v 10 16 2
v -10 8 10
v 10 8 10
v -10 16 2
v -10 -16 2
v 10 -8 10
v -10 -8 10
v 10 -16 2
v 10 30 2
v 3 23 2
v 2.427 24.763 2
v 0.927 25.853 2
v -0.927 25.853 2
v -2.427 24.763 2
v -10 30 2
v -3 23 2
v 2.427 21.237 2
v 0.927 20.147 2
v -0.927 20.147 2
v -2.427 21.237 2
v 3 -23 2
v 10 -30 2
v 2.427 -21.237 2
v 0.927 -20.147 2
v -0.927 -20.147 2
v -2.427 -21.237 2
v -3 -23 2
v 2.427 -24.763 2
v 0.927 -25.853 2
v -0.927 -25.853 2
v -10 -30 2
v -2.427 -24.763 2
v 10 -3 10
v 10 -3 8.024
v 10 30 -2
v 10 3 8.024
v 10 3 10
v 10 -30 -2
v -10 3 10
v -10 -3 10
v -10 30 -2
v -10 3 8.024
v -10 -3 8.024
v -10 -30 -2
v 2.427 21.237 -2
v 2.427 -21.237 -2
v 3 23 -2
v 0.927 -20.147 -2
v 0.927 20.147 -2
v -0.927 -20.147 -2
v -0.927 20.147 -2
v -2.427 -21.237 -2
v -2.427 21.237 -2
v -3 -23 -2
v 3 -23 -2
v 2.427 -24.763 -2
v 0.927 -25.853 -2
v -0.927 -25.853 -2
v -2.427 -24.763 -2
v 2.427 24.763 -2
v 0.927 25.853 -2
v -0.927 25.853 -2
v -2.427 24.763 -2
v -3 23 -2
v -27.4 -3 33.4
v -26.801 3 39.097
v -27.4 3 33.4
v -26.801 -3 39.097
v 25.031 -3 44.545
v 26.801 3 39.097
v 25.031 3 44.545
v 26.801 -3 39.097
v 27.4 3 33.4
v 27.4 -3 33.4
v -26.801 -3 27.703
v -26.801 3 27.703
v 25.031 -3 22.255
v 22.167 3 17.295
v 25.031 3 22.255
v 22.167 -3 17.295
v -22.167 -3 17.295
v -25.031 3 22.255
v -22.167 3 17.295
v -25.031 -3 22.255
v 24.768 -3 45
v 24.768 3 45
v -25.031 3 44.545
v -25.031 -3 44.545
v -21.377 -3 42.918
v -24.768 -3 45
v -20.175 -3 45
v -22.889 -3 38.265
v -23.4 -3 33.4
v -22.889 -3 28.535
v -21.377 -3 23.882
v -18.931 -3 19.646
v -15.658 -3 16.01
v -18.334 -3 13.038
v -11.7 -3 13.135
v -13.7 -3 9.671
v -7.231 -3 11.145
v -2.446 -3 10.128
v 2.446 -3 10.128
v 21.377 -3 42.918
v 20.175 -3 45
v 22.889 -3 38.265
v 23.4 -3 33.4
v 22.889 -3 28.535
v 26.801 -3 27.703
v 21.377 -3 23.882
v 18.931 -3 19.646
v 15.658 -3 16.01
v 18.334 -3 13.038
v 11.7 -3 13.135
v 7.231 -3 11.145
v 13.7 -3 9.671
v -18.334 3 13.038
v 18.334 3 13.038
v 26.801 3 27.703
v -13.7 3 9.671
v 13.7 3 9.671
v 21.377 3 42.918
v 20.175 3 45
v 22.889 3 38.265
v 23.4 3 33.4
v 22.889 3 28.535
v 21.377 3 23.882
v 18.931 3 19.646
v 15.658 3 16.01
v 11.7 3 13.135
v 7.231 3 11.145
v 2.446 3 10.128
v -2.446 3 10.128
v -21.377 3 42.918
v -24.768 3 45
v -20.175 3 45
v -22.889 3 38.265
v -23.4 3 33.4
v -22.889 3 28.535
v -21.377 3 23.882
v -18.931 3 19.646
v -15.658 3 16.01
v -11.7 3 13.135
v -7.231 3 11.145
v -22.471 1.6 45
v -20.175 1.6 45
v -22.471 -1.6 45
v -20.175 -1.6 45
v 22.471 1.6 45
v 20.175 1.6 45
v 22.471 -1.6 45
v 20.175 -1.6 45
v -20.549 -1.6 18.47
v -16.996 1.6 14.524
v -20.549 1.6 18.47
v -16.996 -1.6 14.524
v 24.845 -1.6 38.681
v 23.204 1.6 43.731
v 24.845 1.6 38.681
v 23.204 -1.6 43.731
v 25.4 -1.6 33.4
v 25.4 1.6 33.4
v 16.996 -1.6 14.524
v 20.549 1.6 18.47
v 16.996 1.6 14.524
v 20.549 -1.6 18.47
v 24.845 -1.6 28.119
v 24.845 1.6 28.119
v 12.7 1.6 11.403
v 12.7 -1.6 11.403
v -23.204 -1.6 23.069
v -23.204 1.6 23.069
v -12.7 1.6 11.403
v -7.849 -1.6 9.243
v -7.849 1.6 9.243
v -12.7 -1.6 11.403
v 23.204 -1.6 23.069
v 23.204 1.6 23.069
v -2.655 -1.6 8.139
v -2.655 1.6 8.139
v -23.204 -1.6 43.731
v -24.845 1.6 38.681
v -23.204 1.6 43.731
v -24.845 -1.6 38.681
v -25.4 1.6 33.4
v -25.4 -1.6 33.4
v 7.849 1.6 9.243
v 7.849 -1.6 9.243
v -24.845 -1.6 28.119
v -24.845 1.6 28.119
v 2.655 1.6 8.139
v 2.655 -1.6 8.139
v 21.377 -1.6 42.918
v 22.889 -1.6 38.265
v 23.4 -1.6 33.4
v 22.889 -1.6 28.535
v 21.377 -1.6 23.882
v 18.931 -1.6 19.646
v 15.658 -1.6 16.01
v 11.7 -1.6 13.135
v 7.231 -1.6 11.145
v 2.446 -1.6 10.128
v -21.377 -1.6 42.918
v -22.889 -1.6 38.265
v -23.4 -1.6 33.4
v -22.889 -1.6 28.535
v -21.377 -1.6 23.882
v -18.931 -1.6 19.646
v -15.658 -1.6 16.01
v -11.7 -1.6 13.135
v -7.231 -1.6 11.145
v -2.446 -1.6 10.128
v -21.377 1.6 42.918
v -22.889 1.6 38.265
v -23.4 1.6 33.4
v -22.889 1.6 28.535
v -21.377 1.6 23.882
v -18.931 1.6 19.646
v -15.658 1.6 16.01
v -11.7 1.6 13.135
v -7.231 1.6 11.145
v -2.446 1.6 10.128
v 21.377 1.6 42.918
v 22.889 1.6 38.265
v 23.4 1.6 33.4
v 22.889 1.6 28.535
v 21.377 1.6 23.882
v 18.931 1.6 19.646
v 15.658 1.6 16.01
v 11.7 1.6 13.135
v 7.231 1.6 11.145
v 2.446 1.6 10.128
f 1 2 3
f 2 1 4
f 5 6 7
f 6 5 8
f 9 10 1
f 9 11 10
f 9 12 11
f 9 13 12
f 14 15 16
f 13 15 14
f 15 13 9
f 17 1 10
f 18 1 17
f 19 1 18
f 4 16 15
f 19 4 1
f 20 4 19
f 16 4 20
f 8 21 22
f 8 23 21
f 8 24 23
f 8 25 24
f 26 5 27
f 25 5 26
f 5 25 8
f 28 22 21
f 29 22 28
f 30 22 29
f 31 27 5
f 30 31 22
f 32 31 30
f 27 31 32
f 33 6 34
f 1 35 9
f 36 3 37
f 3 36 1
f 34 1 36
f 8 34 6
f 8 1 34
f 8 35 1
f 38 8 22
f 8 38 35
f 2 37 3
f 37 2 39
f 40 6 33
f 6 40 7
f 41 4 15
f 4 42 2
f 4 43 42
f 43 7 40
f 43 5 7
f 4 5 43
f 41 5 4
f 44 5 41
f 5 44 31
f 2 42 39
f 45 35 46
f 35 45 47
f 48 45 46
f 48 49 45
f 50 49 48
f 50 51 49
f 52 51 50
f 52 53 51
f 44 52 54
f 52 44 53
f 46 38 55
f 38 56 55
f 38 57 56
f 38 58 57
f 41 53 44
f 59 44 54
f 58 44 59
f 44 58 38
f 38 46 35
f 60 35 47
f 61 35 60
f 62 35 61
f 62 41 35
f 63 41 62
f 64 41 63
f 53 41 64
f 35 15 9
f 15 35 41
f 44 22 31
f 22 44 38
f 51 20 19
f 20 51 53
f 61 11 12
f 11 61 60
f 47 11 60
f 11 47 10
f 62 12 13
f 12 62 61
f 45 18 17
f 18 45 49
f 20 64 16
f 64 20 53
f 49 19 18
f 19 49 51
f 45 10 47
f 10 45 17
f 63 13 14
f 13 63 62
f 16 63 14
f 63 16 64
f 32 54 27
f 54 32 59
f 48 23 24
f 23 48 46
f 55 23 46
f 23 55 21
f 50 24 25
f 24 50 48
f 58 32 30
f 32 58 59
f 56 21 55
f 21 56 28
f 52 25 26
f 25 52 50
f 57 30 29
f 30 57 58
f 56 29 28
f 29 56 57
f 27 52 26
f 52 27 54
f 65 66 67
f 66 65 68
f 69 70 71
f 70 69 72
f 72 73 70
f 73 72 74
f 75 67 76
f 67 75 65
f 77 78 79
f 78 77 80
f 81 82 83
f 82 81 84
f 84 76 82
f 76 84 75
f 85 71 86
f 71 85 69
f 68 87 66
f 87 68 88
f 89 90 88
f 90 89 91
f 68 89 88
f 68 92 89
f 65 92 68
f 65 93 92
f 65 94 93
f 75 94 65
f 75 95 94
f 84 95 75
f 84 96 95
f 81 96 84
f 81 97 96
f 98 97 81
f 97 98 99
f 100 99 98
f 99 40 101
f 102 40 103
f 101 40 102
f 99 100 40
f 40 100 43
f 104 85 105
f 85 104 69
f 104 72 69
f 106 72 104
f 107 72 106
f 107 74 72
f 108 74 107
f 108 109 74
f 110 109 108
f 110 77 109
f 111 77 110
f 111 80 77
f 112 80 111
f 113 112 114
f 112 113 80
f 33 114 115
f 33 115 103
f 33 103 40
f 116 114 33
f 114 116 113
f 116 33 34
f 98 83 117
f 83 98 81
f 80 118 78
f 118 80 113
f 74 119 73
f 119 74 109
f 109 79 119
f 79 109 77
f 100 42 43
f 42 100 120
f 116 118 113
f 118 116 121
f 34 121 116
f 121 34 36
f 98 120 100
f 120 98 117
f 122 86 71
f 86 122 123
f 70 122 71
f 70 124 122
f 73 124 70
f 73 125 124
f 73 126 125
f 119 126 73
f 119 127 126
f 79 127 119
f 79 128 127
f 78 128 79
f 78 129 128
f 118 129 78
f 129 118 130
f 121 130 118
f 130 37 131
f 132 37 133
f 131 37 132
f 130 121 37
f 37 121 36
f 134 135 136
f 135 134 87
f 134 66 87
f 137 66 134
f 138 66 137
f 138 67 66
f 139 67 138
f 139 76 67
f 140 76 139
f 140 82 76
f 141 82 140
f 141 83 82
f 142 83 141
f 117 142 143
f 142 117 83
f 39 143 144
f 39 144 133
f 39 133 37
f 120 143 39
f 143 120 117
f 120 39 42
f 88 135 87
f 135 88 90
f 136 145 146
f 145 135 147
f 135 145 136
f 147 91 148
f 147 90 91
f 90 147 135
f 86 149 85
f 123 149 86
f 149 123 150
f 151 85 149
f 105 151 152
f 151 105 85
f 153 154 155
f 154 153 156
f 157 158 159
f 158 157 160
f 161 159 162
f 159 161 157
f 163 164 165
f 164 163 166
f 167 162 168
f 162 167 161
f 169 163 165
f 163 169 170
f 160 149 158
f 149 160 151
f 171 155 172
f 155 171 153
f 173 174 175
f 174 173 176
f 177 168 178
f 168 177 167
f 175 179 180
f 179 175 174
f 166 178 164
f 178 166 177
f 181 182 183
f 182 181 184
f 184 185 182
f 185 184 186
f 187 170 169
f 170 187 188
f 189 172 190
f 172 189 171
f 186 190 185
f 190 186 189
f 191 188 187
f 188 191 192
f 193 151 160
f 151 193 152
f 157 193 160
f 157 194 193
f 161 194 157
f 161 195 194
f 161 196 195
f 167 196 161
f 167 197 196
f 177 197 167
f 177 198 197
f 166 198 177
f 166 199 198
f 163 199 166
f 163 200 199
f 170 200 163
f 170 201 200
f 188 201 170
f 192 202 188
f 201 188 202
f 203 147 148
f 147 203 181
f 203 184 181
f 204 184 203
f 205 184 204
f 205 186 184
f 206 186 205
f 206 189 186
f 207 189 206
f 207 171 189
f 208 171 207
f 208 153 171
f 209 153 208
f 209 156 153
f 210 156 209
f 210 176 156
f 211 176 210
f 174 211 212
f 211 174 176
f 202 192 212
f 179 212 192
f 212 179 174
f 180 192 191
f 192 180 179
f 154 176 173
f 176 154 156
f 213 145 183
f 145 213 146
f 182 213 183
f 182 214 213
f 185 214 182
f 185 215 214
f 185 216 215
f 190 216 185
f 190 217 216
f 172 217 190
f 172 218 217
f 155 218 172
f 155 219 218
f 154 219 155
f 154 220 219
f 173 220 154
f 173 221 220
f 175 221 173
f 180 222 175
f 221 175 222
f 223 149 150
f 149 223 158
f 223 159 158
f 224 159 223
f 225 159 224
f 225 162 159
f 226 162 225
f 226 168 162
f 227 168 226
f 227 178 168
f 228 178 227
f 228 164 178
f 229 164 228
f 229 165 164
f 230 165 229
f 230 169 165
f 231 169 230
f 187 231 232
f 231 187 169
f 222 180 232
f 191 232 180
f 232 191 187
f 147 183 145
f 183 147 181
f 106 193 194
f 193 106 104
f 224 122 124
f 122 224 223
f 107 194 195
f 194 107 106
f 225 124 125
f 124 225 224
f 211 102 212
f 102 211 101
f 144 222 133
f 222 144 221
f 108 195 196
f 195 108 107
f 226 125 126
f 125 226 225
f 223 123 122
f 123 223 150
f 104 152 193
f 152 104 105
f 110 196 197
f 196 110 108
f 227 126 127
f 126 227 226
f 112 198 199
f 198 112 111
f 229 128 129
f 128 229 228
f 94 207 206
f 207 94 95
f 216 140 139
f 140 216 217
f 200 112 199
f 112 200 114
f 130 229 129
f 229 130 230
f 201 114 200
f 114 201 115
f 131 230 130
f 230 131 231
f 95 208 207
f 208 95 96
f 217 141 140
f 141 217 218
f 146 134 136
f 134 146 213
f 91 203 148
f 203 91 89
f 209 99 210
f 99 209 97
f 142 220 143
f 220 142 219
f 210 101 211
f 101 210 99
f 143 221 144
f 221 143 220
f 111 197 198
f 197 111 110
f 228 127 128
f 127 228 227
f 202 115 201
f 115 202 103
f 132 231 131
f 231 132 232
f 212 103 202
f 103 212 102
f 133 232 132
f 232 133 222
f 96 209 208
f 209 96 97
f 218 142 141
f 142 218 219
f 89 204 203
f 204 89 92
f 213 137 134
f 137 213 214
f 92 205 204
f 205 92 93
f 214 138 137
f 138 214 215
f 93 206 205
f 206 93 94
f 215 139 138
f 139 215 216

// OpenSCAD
module trapezoid_3d(bottom_length, top_length, height, depth) {
    points = [
        [-(bottom_length / 2), 0], // Bottom left
        [ (bottom_length / 2), 0], // Bottom right
        [ (top_length / 2), height], // Top right
        [-(top_length / 2), height] // Top left
    ];
    
    faces = [
        [0, 1, 2, 3] // Face for the trapezoid
    ];
    
    rotate([90, 0, 90]) {
        linear_extrude(height = depth) polygon(points=points, paths=faces);
    }
}

module raw_base() {
    union() {
        translate([-10, 0, 2])
        trapezoid_3d(32, 16, 8, 20);
        cube([20, 60, 4], center = true); 
    }
}

module base() {
    difference() {
        raw_base();
        translate([0, (30-2-5), 0])
        cylinder(r = 3, h = 20, center = true);
        translate([0,-(30-2-5), 0])
        cylinder(r = 3, h = 20, center = true);
    }
}



module lens() {
    translate([0, 0, 8+25.4])
    rotate([90, 0, 0])
    cylinder(3.2, 25.4, 25.4, center=true);
}

module lens_frame() {
    difference() {
        translate([0, 0, 6+27.4])
        rotate([90, 0, 0])
        cylinder(6, 27.4, 27.4, center=true);
        
        translate([0,0,65])
        cube([100, 20, 40], center=true);
    }
}

module lens_clearance() {
    translate([0, 0, 10+23.4])
    rotate([90, 0, 0])
    cylinder(20, 23.4, 23.4, center=true);
}

difference() {
    union() {
        base();
        lens_frame();
    }
    lens();
    lens_clearance();
}
